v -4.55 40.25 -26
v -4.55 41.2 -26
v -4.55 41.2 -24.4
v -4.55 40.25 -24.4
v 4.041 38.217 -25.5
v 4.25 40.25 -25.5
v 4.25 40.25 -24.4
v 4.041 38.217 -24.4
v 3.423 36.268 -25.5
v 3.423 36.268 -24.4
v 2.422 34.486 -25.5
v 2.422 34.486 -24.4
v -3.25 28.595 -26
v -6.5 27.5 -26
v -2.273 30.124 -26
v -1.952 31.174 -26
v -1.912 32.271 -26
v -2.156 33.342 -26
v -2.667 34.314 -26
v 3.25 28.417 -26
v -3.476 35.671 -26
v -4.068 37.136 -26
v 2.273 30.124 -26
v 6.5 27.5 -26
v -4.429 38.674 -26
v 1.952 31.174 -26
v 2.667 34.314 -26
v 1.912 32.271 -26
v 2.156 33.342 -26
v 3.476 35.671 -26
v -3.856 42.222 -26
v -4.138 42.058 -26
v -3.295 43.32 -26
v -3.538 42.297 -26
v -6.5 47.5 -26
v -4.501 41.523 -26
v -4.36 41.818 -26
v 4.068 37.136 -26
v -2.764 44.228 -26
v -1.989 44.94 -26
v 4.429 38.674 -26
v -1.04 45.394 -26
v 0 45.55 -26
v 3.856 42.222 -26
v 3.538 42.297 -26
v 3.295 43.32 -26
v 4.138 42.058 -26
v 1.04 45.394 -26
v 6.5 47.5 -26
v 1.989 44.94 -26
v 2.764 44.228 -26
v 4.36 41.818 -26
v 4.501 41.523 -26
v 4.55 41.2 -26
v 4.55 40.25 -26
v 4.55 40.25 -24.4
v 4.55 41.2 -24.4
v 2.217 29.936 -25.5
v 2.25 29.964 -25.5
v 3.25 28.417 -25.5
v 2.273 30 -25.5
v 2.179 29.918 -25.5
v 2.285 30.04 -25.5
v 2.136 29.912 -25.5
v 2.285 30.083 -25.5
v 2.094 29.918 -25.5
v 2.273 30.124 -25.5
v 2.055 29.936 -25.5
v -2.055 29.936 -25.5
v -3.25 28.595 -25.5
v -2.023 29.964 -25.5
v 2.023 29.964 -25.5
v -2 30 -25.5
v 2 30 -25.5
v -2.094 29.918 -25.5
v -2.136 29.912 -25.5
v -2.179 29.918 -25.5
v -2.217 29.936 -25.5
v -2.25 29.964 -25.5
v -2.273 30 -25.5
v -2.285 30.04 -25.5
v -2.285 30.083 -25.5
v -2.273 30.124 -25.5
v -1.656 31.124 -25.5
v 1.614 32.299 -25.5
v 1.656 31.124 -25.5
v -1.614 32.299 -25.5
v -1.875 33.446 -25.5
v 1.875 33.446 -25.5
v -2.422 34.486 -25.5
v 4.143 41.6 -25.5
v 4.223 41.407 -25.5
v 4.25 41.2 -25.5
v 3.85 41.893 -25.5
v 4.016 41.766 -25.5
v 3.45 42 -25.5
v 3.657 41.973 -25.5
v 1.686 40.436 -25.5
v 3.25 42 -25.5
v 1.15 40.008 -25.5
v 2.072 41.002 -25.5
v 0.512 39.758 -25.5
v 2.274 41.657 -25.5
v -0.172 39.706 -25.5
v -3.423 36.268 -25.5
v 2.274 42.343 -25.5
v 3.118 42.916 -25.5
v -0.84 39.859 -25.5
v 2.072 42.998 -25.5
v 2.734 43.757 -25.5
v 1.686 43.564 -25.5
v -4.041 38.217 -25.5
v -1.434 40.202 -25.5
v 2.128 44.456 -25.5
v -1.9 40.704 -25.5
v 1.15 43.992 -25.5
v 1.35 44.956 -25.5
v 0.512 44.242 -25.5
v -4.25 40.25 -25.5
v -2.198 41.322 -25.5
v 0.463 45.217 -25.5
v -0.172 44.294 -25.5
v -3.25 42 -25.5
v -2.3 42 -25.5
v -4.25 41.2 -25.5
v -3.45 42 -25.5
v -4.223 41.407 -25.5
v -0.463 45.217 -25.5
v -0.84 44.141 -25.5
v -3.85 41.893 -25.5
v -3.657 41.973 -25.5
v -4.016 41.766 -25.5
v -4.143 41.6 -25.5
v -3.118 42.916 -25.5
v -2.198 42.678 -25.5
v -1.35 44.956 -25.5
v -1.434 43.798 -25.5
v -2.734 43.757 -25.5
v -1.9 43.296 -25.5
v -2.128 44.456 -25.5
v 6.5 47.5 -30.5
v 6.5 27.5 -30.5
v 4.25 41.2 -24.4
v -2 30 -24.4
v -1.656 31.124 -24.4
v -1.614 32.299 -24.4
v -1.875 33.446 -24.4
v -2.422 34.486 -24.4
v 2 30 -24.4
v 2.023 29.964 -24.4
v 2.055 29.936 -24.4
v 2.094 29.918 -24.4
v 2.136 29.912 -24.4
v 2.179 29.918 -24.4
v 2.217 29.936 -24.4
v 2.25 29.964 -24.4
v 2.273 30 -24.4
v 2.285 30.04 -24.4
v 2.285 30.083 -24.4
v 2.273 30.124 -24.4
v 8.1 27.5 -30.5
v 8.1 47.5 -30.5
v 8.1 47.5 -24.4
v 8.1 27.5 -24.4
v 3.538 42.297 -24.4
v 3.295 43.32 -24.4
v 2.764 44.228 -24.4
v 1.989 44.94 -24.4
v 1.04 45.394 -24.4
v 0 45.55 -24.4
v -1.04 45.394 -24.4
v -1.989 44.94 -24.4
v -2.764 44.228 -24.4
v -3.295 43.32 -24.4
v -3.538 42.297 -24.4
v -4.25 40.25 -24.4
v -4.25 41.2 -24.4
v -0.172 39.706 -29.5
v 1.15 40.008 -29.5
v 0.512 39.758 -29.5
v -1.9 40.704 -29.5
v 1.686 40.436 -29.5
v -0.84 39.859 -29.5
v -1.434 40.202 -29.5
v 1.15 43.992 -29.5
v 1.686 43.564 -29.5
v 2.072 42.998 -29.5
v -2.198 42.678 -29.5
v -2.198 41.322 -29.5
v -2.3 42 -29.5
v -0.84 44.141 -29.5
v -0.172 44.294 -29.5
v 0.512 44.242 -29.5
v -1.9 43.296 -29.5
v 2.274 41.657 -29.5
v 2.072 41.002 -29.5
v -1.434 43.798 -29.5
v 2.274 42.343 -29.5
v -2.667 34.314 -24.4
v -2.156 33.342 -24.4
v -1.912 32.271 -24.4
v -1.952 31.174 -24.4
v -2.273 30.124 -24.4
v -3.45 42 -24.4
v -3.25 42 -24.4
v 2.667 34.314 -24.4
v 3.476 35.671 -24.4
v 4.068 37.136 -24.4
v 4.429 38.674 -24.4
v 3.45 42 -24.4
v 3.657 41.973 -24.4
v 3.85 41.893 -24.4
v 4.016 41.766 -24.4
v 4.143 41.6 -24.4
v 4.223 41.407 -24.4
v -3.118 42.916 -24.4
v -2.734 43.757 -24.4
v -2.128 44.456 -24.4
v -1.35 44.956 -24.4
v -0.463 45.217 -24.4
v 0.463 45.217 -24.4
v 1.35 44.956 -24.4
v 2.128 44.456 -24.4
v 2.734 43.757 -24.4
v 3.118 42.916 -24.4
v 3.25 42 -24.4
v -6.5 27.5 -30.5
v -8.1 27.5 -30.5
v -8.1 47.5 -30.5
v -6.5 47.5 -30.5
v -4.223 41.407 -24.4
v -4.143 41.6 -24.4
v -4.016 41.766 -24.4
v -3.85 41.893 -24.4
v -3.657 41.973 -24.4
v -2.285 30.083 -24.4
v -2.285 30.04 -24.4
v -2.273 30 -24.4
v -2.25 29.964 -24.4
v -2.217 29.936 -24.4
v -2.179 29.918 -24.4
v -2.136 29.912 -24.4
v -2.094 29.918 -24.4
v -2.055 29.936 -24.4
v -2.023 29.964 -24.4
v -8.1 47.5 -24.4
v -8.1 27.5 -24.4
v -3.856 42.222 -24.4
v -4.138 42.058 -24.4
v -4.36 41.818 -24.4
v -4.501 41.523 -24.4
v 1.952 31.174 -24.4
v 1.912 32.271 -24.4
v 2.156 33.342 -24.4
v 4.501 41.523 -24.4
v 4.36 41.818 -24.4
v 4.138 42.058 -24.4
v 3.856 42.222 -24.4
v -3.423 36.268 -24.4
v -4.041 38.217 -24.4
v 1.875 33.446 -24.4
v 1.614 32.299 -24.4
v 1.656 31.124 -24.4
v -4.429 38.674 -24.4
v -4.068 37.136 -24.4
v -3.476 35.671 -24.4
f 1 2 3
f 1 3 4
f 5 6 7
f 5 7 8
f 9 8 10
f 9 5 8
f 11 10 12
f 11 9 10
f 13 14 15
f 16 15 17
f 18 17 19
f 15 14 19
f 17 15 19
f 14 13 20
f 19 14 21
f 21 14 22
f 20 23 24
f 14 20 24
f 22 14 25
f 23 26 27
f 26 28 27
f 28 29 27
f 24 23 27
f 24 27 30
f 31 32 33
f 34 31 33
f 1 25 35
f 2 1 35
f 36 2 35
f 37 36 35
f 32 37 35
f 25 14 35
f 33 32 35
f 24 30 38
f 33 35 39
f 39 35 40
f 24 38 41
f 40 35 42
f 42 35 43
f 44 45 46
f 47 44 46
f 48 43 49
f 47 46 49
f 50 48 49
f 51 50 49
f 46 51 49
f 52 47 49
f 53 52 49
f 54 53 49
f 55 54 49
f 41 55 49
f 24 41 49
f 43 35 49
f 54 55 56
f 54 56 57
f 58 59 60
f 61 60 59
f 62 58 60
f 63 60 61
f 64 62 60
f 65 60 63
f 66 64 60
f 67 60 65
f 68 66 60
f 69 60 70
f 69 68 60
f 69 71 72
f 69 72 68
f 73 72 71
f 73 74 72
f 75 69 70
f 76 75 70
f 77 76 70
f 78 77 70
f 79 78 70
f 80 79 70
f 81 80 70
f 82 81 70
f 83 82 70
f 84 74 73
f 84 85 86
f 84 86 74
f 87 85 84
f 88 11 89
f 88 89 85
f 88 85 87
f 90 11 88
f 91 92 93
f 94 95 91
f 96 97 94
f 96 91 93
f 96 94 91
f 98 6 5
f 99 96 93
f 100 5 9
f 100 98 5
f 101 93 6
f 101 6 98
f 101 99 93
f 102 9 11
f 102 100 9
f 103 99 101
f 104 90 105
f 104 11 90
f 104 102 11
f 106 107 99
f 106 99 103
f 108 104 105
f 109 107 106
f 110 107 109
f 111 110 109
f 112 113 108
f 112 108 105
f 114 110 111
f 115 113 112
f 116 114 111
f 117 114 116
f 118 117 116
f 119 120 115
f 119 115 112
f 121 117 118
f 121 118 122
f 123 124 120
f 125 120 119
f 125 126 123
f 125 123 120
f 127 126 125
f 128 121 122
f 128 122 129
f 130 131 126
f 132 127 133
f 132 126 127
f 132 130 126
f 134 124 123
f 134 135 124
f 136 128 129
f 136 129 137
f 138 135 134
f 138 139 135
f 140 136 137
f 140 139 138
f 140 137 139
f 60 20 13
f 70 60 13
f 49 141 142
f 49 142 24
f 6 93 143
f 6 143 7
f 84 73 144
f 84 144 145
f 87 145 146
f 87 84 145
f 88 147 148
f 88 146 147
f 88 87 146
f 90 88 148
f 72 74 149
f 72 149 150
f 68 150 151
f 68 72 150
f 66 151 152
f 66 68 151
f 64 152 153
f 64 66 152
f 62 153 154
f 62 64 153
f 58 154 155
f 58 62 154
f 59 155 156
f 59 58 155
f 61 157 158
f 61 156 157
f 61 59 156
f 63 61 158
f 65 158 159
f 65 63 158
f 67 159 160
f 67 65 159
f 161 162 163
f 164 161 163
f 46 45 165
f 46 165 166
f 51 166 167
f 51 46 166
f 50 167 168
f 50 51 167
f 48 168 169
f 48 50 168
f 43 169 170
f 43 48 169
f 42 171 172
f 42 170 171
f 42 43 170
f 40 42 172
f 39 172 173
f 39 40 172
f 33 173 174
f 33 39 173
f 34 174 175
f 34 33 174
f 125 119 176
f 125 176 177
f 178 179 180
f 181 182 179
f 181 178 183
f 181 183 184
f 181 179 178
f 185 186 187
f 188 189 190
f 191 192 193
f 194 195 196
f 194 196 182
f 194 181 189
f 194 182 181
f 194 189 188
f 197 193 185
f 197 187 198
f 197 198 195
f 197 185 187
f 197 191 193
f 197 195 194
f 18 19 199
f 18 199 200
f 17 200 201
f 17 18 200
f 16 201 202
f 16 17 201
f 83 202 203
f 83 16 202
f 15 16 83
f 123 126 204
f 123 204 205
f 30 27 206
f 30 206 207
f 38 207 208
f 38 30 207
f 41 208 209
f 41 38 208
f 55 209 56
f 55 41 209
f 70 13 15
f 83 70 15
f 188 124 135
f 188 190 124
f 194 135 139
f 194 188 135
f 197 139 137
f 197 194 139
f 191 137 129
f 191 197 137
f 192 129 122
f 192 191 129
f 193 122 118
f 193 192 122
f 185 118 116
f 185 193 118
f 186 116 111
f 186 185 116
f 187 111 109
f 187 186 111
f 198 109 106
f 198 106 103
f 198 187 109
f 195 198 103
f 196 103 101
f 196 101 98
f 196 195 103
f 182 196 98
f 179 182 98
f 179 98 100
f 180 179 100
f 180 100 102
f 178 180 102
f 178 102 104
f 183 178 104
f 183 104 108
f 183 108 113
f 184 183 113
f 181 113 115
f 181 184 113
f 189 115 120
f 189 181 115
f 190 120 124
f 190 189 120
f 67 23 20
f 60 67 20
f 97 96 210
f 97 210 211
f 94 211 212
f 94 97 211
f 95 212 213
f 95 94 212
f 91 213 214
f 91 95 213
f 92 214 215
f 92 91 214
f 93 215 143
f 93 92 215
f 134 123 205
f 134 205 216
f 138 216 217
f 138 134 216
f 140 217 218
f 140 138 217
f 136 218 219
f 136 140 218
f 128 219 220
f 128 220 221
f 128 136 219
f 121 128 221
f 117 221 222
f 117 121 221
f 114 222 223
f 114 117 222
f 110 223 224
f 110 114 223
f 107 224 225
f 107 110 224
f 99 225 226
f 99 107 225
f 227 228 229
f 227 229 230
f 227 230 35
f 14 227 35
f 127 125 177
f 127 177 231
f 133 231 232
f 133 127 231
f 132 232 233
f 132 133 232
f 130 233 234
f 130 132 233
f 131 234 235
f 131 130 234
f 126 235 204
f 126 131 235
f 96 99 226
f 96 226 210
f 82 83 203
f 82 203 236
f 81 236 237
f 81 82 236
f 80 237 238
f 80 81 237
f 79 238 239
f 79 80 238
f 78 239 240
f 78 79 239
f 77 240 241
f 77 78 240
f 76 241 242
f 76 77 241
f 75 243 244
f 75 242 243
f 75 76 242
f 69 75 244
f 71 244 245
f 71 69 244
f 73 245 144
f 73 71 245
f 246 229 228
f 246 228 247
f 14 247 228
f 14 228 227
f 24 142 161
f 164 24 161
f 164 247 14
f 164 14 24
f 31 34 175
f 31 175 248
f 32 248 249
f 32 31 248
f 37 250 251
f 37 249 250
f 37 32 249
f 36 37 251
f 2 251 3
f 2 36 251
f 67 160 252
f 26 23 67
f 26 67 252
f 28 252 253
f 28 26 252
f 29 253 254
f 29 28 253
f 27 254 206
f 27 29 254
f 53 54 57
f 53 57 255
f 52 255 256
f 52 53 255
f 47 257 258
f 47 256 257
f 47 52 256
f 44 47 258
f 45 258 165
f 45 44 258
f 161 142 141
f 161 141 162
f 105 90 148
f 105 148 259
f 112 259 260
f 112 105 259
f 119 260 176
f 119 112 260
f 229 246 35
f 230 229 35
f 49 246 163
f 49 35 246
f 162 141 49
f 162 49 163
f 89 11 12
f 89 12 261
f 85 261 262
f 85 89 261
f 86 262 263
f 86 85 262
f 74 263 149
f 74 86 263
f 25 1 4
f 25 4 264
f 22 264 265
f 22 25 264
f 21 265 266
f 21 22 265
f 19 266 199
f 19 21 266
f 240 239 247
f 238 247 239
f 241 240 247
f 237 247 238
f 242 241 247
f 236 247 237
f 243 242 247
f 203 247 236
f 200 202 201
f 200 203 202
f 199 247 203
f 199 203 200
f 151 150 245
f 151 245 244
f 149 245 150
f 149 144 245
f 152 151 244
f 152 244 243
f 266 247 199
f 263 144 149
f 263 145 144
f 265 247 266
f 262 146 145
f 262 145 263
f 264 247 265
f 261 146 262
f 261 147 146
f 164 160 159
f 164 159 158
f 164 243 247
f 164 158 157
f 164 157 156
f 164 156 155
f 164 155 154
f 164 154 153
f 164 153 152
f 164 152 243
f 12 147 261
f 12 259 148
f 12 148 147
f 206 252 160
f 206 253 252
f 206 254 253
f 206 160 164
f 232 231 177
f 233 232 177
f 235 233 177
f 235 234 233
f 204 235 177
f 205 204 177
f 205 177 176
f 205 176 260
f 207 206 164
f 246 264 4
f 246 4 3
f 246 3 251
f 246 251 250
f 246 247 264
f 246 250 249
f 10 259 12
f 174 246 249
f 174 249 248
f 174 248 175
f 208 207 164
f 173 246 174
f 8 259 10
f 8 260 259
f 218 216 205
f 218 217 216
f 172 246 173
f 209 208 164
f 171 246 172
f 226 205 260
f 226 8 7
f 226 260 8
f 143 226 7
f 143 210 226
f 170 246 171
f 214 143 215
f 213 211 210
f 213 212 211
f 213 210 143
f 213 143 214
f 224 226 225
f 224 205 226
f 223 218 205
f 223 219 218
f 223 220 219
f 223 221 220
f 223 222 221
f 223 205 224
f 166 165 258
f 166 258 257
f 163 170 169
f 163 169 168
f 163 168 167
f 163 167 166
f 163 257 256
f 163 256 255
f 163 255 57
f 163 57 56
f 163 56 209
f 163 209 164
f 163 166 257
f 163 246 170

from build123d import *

# Parameters (mm, degrees)
CUT_EXTRUDE1_DEPTH     = 5
CUT_EXTRUDE3_DEPTH     = 45
SKETCH8_R              = 40
CUT_EXTRUDE4_DEPTH     = 32
FILLET1_R              = 7
FILLET2_R              = 8
CUT_REVOLVE1_START     = 17
CUT_REVOLVE1_DEPTH     = 30.5
SKETCH18_W             = 13
SKETCH18_H             = 8
CUT_EXTRUDE13_DEPTH    = 5
SKETCH20_W             = 84
SKETCH20_H             = 7
CUT_EXTRUDE15_DEPTH    = 5
SKETCH19_R             = 1.5
CUT_EXTRUDE14_DEPTH    = 12
FILLET3_R              = 4
SKETCH21_W             = 16
SKETCH21_H             = 5
CUT_EXTRUDE16_DEPTH    = 5
CIRPATTERN1_COUNT      = 4
SKETCH22_W             = 5
SKETCH22_H             = 12
BOSS_EXTRUDE1_DEPTH    = 1.5
SKETCH23_W             = 5
SKETCH23_H             = 4.4
SKETCH23_H_2           = 4
BOSS_EXTRUDE2_DEPTH    = 17
SKETCH24_W             = 2
SKETCH24_H             = 3
BOSS_EXTRUDE3_DEPTH    = 2
CIRPATTERN2_COUNT      = 5
CUT_REVOLVE2_START     = 17
CUT_REVOLVE2_DEPTH     = 30.5
SKETCH29_W             = 16.2
SKETCH29_H             = 11.2
SKETCH29_W_2           = 13
SKETCH29_H_2           = 8
BOSS_EXTRUDE4_DEPTH    = 20
CUT_EXTRUDE18_DEPTH    = 12
SKETCH34_R             = 2.3
BOSS_EXTRUDE5_DEPTH    = 3.5
BOSS_EXTRUDE6_START    = 3.5
SKETCH35_R             = 2.3
BOSS_EXTRUDE6_DEPTH    = 3.5
SKETCH36_W             = 2
SKETCH36_H             = 2
BOSS_EXTRUDE7_DEPTH    = 5
SKETCH37_W             = 2
SKETCH37_H             = 2
BOSS_EXTRUDE8_DEPTH    = 12.5
SKETCH40_W             = 2
SKETCH40_H             = 2
BOSS_EXTRUDE9_DEPTH    = 5
INTERSECT5_OUTLINE_R   = 42
INTERSECT5_DEPTH       = 55
INTERSECT5_2_OUTLINE_W = 16
INTERSECT5_2_OUTLINE_H = 5
INTERSECT5_2_DEPTH     = 15.5
INTERSECT5_START       = 47.5
INTERSECT5_3_OUTLINE_W = 13
INTERSECT5_3_OUTLINE_H = 8
INTERSECT5_3_DEPTH     = 2.5
INTERSECT6_START       = -35.6
INTERSECT6_OUTLINE_W   = 16.2
INTERSECT6_OUTLINE_H   = 20
INTERSECT6_DEPTH       = 5.1
SKETCH46_R             = 2.3
CUT_EXTRUDE20_DEPTH    = 0.5


# Read off the part's stored shape, not the designer's step: Cut-Revolve1, Cut-Revolve2, Intersect5, Intersect6
with BuildPart() as part:
    # Sketch1 → Revolve1 (revolve)
    with BuildSketch(Plane.XY, mode=Mode.PRIVATE) as revolve1_sk:
        with BuildLine():
            Line((37, 55), (0, 55))
            Line((0, 55), (0, 11.5))
            Line((0, 11.5), (22.5, 11.5))
            Line((22.5, 11.5), (22.5, 0))
            Line((22.5, 0), (25, 0))
            Line((25, 0), (25, 11.5))
            Line((25, 11.5), (42, 11.5))
            Line((42, 11.5), (42, 50))
            ThreePointArc((42, 50), (40.535533906, 53.535533906), (37, 55))
        make_face()
    revolve(revolve1_sk.sketch.rotate(Axis((0, 2, 0), (0, 1, 0)), 90), axis=Axis((0, 2, 0), (0, 1, 0)))

    # Sketch5 → Cut-Extrude1 (cut)
    with BuildSketch(Plane(origin=(0, 55, 0), x_dir=(1, 0, 0), z_dir=(0, 1, 0))):
        with BuildLine():
            Line((-42, 0), (-40, 0))
            Line((-40, 0), (40, 0))
            Line((40, 0), (42, 0))
            ThreePointArc((42, 0), (0, 42), (-42, 0))
        make_face()
    extrude(amount=-CUT_EXTRUDE1_DEPTH, mode=Mode.SUBTRACT)

    # Sketch7 → Cut-Extrude3 (cut)
    with BuildSketch(Plane.XZ.offset(-11.5)):
        with BuildLine():
            Line((-21, 0), (21, 0))
            ThreePointArc((21, 0), (0, -21), (-21, 0))
        make_face()
    extrude(amount=-CUT_EXTRUDE3_DEPTH, mode=Mode.SUBTRACT)

    # Sketch8 → Cut-Extrude4 (cut)
    with BuildSketch(Plane(origin=(0, 47.5, 0), x_dir=(1, 0, 0), z_dir=(0, 1, 0))):
        with Locations(Location((0, 0, 0), (0, 0, 270))):
            Circle(SKETCH8_R)
        with BuildLine():
            Line((22.912878475, -2), (-22.912878475, -2))
            ThreePointArc((-22.912878475, -2), (0, 23), (22.912878475, -2))
        make_face(mode=Mode.SUBTRACT)
    extrude(amount=-CUT_EXTRUDE4_DEPTH, mode=Mode.SUBTRACT)

    # Fillet1
    fillet1_edges = [part.edges().sort_by_distance(p)[0] for p in [
        (21, 30.75, 0),
        (-21, 30.75, 0),
    ]]
    fillet(fillet1_edges, radius=FILLET1_R)

    # Fillet2
    fillet2_edges = [part.edges().sort_by_distance(p)[0] for p in [
        (-22.912878475, 31.5, 2),
        (22.912878475, 31.5, 2),
    ]]
    fillet(fillet2_edges, radius=FILLET2_R)

    # Cut-Revolve1 outline → Cut-Revolve1 (cut)
    with BuildSketch(Plane(origin=(0, 0, 0), x_dir=(1, 0, 0), z_dir=(0, 1, 0)).offset(CUT_REVOLVE1_START)):
        with BuildLine():
            Line((-34.641016151, -20), (-36.373066959, -21))
            ThreePointArc((-36.373066959, -21), (0, -42), (36.373066959, -21))
            Line((36.373066959, -21), (34.641016151, -20))
            ThreePointArc((34.641016151, -20), (0, -40), (-34.641016151, -20))
        make_face()
    extrude(amount=CUT_REVOLVE1_DEPTH, mode=Mode.SUBTRACT)

    # Sketch18 → Cut-Extrude13 (cut)
    with BuildSketch(Plane(origin=(0, 50, 0), x_dir=(1, 0, 0), z_dir=(0, 1, 0))):
        with Locations((0, 30)):
            Rectangle(SKETCH18_W, SKETCH18_H)
    extrude(amount=-CUT_EXTRUDE13_DEPTH, mode=Mode.SUBTRACT)

    # Sketch20 → Cut-Extrude15 (cut)
    with BuildSketch(Plane(origin=(0, 55, 0), x_dir=(1, 0, 0), z_dir=(0, 1, 0))):
        with Locations((0, -3.5)):
            Rectangle(SKETCH20_W, SKETCH20_H)
    extrude(amount=-CUT_EXTRUDE15_DEPTH, mode=Mode.SUBTRACT)

    # Sketch19 → Cut-Extrude14 (cut)
    with BuildSketch(Plane(origin=(0, 0, 7), x_dir=(-1, 0, 0), z_dir=(0, 0, -1))):
        with Locations((0, 52.5)):
            Circle(SKETCH19_R)
        with Locations((-29.412558482, 52.5)):
            Circle(SKETCH19_R)
        with Locations((29.412558482, 52.5)):
            Circle(SKETCH19_R)
    extrude(amount=-CUT_EXTRUDE14_DEPTH, mode=Mode.SUBTRACT)

    # Fillet3
    fillet3_edges = [part.edges().sort_by_distance(p)[0] for p in [
        (0, 11.5, 42),
    ]]
    fillet(fillet3_edges, radius=FILLET3_R)

    # Sketch21 → Cut-Extrude16 (cut)
    with BuildSketch(Plane(origin=(0, 15.5, 0), x_dir=(1, 0, 0), z_dir=(0, 1, 0))):
        with Locations((0, -29.5)):
            Rectangle(SKETCH21_W, SKETCH21_H)
    cut_extrude16 = extrude(amount=-CUT_EXTRUDE16_DEPTH, mode=Mode.SUBTRACT)

    # CirPattern1: Cut-Extrude16 ×4 about axis
    cirpattern1_axis = Axis((0, 0, 0), (0, 1, 0))
    for i in range(1, CIRPATTERN1_COUNT):
        add(cut_extrude16.rotate(cirpattern1_axis, i * 360 / CIRPATTERN1_COUNT), mode=Mode.SUBTRACT)

    # Sketch22 → Boss-Extrude1 (add)
    with BuildSketch(Plane(origin=(0, 15.5, 0), x_dir=(1, 0, 0), z_dir=(0, 1, 0))):
        with Locations((35.5, -4)):
            Rectangle(SKETCH22_W, SKETCH22_H)
    extrude(amount=BOSS_EXTRUDE1_DEPTH)

    # Sketch23 → Boss-Extrude2 (add)
    with BuildSketch(Plane(origin=(0, 17, 0), x_dir=(1, 0, 0), z_dir=(0, 1, 0))):
        with Locations((35.5, -0.2)):
            Rectangle(SKETCH23_W, SKETCH23_H)
        with Locations((35.5, -8)):
            Rectangle(SKETCH23_W, SKETCH23_H_2)
    extrude(amount=BOSS_EXTRUDE2_DEPTH)

    # Sketch24 → Boss-Extrude3 (add)
    with BuildSketch(Plane.XZ):
        with Locations((0, -22.5)):
            Rectangle(SKETCH24_W, SKETCH24_H)
    boss_extrude3 = extrude(amount=-BOSS_EXTRUDE3_DEPTH)

    # CirPattern2: Boss-Extrude3 ×5 about axis
    cirpattern2_axis = Axis((0, 0, 0), (0, 1, 0))
    for i in range(1, CIRPATTERN2_COUNT):
        add(boss_extrude3.rotate(cirpattern2_axis, i * 360 / CIRPATTERN2_COUNT))

    # Cut-Revolve2 outline → Cut-Revolve2 (cut)
    with BuildSketch(Plane(origin=(0, 0, 0), x_dir=(1, 0, 0), z_dir=(0, 1, 0)).offset(CUT_REVOLVE2_START)):
        with BuildLine():
            ThreePointArc((-30.641777725, 25.711504387), (0, 40), (30.641777725, 25.711504387))
            Line((30.641777725, 25.711504387), (32.173866611, 26.997079607))
            ThreePointArc((32.173866611, 26.997079607), (0, 42), (-32.173866611, 26.997079607))
            Line((-32.173866611, 26.997079607), (-30.641777725, 25.711504387))
        make_face()
    extrude(amount=CUT_REVOLVE2_DEPTH, mode=Mode.SUBTRACT)

    # Sketch29 → Boss-Extrude4 (add)
    with BuildSketch(Plane.XZ.offset(-47.5)):
        with Locations((0, -30)):
            Rectangle(SKETCH29_W, SKETCH29_H)
        with Locations((0, -30)):
            Rectangle(SKETCH29_W_2, SKETCH29_H_2, mode=Mode.SUBTRACT)
    extrude(amount=BOSS_EXTRUDE4_DEPTH)

    # Sketch32 → Cut-Extrude18 (cut)
    with BuildSketch(Plane(origin=(0, 0, -35.6), x_dir=(-1, 0, 0), z_dir=(0, 0, -1))):
        with BuildLine():
            Line((-4.55, 40.24987133), (-4.55, 41.2))
            ThreePointArc((-4.55, 41.2), (-4.258194078, 41.946205288), (-3.537595761, 42.296506718))
            ThreePointArc((-3.537595761, 42.296506718), (0, 45.55), (3.537595761, 42.296506718))
            ThreePointArc((3.537595761, 42.296506718), (4.258194078, 41.946205288), (4.55, 41.2))
            Line((4.55, 41.2), (4.55, 40.24987133))
            ThreePointArc((4.55, 40.24987133), (4.068040722, 37.136018992), (2.667266721, 34.313574426))
            ThreePointArc((2.667266721, 34.313574426), (1.91246078, 32.271330642), (2.273109943, 30.124140883))
            ThreePointArc((2.273109943, 30.124140883), (2.198625413, 29.92551547), (2, 30))
            ThreePointArc((2, 30), (1.613779787, 32.29943161), (2.422103613, 34.486476277))
            ThreePointArc((2.422103613, 34.486476277), (3.782078371, 37.22671372), (4.25, 40.24987133))
            Line((4.25, 40.24987133), (4.25, 41.2))
            ThreePointArc((4.25, 41.2), (4.015685425, 41.765685425), (3.45, 42))
            Line((3.45, 42), (3.25, 42))
            ThreePointArc((3.25, 42), (0, 45.25), (-3.25, 42))
            Line((-3.25, 42), (-3.45, 42))
            ThreePointArc((-3.45, 42), (-4.015685425, 41.765685425), (-4.25, 41.2))
            Line((-4.25, 41.2), (-4.25, 40.24987133))
            ThreePointArc((-4.25, 40.24987133), (-3.782078371, 37.22671372), (-2.422103613, 34.486476277))
            ThreePointArc((-2.422103613, 34.486476277), (-1.613779787, 32.29943161), (-2, 30))
            ThreePointArc((-2, 30), (-2.198625413, 29.92551547), (-2.273109943, 30.124140883))
            ThreePointArc((-2.273109943, 30.124140883), (-1.91246078, 32.271330642), (-2.667266721, 34.313574426))
            ThreePointArc((-2.667266721, 34.313574426), (-4.068040722, 37.136018992), (-4.55, 40.24987133))
        make_face()
    extrude(amount=-CUT_EXTRUDE18_DEPTH, mode=Mode.SUBTRACT)

    # Sketch34 → Boss-Extrude5 (add)
    with BuildSketch(Plane.XY.offset(-34)):
        with Locations(Location((0, 42, 0), (0, 0, 180))):
            Circle(SKETCH34_R)
    extrude(amount=BOSS_EXTRUDE5_DEPTH)

    # Sketch35 → Boss-Extrude6 (add)
    with BuildSketch(Plane(origin=(0, 0, -26), x_dir=(-1, 0, 0), z_dir=(0, 0, -1)).offset(BOSS_EXTRUDE6_START)):
        with Locations((0, 42)):
            Circle(SKETCH35_R)
    extrude(amount=-BOSS_EXTRUDE6_DEPTH)

    # Sketch36 → Boss-Extrude7 (add)
    with BuildSketch(Plane(origin=(0, 0, -35.6), x_dir=(-1, 0, 0), z_dir=(0, 0, -1))):
        with Locations((-6.159647943, 37.918102195)):
            Rectangle(SKETCH36_W, SKETCH36_H)
    extrude(amount=BOSS_EXTRUDE7_DEPTH)

    # Sketch37 → Boss-Extrude8 (add)
    with BuildSketch(Plane.ZY.offset(-5.159647943)):
        with Locations((-39.597351245, 37.918102195)):
            Rectangle(SKETCH37_W, SKETCH37_H)
    extrude(amount=BOSS_EXTRUDE8_DEPTH)

    # Sketch40 → Boss-Extrude9 (add)
    with BuildSketch(Plane(origin=(0, 0, -35.6), x_dir=(-1, 0, 0), z_dir=(0, 0, -1))):
        with Locations((6.340352057, 37.918102195)):
            Rectangle(SKETCH40_W, SKETCH40_H)
    extrude(amount=BOSS_EXTRUDE9_DEPTH)

    # Intersect5 outline → Intersect5 (cut)
    with BuildSketch(Plane(origin=(0, 0, 0), x_dir=(1, 0, 0), z_dir=(0, 1, 0))):
        Circle(INTERSECT5_OUTLINE_R)
        with BuildLine():
            Line((-7.340352057, 39.320722675), (-7.340352057, 35.6))
            Line((-7.340352057, 35.6), (7.159647943, 35.6))
            Line((7.159647943, 35.6), (7.159647943, 39.354027003))
            ThreePointArc((7.159647943, 39.354027003), (32.84390905, 22.831505389), (39.382737335, -7))
            Line((39.382737335, -7), (38, -7))
            Line((38, -7), (38, 2))
            Line((38, 2), (33, 2))
            Line((33, 2), (33, -7))
            Line((33, -7), (32, -7))
            Line((32, -7), (32, 8))
            Line((32, 8), (27, 8))
            Line((27, 8), (27, -7))
            Line((27, -7), (21.38340478, -7))
            ThreePointArc((21.38340478, -7), (22.491014191, -0.635830699), (21.744722088, 5.780749199))
            ThreePointArc((21.744722088, 5.780749199), (21.600641781, 7.527000579), (21.079848197, 9.2))
            ThreePointArc((21.079848197, 9.2), (0, 23), (-21.079848197, 9.2))
            ThreePointArc((-21.079848197, 9.2), (-21.600641781, 7.527000579), (-21.744722088, 5.780749199))
            ThreePointArc((-21.744722088, 5.780749199), (-22.491014191, -0.635830699), (-21.38340478, -7))
            Line((-21.38340478, -7), (-27, -7))
            Line((-27, -7), (-27, 8))
            Line((-27, 8), (-32, 8))
            Line((-32, 8), (-32, -7))
            Line((-32, -7), (-39.382737335, -7))
            ThreePointArc((-39.382737335, -7), (-32.896262825, 22.756007825), (-7.340352057, 39.320722675))
        make_face(mode=Mode.SUBTRACT)
        with BuildLine():
            Line((12.124355653, 0), (-12.124355653, 0))
            ThreePointArc((-12.124355653, 0), (-18.186533479, 3.5), (-18.186533479, 10.5))
            ThreePointArc((-18.186533479, 10.5), (0, 21), (18.186533479, 10.5))
            ThreePointArc((18.186533479, 10.5), (18.186533479, 3.5), (12.124355653, 0))
        make_face(mode=Mode.SUBTRACT)
    extrude(amount=INTERSECT5_DEPTH, mode=Mode.SUBTRACT)

    # Intersect5 2 outline → Intersect5 2 (cut)
    with BuildSketch(Plane(origin=(0, 0, 0), x_dir=(1, 0, 0), z_dir=(0, 1, 0))):
        with BuildLine():
            Line((-7.340352057, 35.6), (-7.340352057, 39.320722675))
            ThreePointArc((-7.340352057, 39.320722675), (-32.896262825, 22.756007825), (-39.382737335, -7))
            Line((-39.382737335, -7), (-32, -7))
            Line((-32, -7), (-32, 8))
            Line((-32, 8), (-27, 8))
            Line((-27, 8), (-27, -7))
            Line((-27, -7), (-21.38340478, -7))
            ThreePointArc((-21.38340478, -7), (-22.491014191, -0.635830699), (-21.744722088, 5.780749199))
            ThreePointArc((-21.744722088, 5.780749199), (-21.600641781, 7.527000579), (-21.079848197, 9.2))
            ThreePointArc((-21.079848197, 9.2), (0, 23), (21.079848197, 9.2))
            ThreePointArc((21.079848197, 9.2), (21.600641781, 7.527000579), (21.744722088, 5.780749199))
            ThreePointArc((21.744722088, 5.780749199), (22.491014191, -0.635830699), (21.38340478, -7))
            Line((21.38340478, -7), (27, -7))
            Line((27, -7), (27, 8))
            Line((27, 8), (32, 8))
            Line((32, 8), (32, -7))
            Line((32, -7), (33, -7))
            Line((33, -7), (33, 2))
            Line((33, 2), (38, 2))
            Line((38, 2), (38, -7))
            Line((38, -7), (39.382737335, -7))
            ThreePointArc((39.382737335, -7), (32.84390905, 22.831505389), (7.159647943, 39.354027003))
            Line((7.159647943, 39.354027003), (7.159647943, 35.6))
            Line((7.159647943, 35.6), (-7.340352057, 35.6))
        make_face()
        with Locations((0, 29.5)):
            Rectangle(INTERSECT5_2_OUTLINE_W, INTERSECT5_2_OUTLINE_H, mode=Mode.SUBTRACT)
    extrude(amount=INTERSECT5_2_DEPTH, mode=Mode.SUBTRACT)

    # Intersect5 3 outline → Intersect5 3 (cut)
    with BuildSketch(Plane(origin=(0, 0, 0), x_dir=(1, 0, 0), z_dir=(0, 1, 0)).offset(INTERSECT5_START)):
        with BuildLine():
            Line((-7.340352057, 35.6), (-7.340352057, 39.320722675))
            ThreePointArc((-7.340352057, 39.320722675), (-32.896262825, 22.756007825), (-39.382737335, -7))
            Line((-39.382737335, -7), (-32, -7))
            Line((-32, -7), (-32, 8))
            Line((-32, 8), (-27, 8))
            Line((-27, 8), (-27, -7))
            Line((-27, -7), (-21.38340478, -7))
            ThreePointArc((-21.38340478, -7), (-22.491014191, -0.635830699), (-21.744722088, 5.780749199))
            ThreePointArc((-21.744722088, 5.780749199), (-21.600641781, 7.527000579), (-21.079848197, 9.2))
            ThreePointArc((-21.079848197, 9.2), (0, 23), (21.079848197, 9.2))
            ThreePointArc((21.079848197, 9.2), (21.600641781, 7.527000579), (21.744722088, 5.780749199))
            ThreePointArc((21.744722088, 5.780749199), (22.491014191, -0.635830699), (21.38340478, -7))
            Line((21.38340478, -7), (27, -7))
            Line((27, -7), (27, 8))
            Line((27, 8), (32, 8))
            Line((32, 8), (32, -7))
            Line((32, -7), (33, -7))
            Line((33, -7), (33, 2))
            Line((33, 2), (38, 2))
            Line((38, 2), (38, -7))
            Line((38, -7), (39.382737335, -7))
            ThreePointArc((39.382737335, -7), (32.84390905, 22.831505389), (7.159647943, 39.354027003))
            Line((7.159647943, 39.354027003), (7.159647943, 35.6))
            Line((7.159647943, 35.6), (-7.340352057, 35.6))
        make_face()
        with Locations((0, 30)):
            Rectangle(INTERSECT5_3_OUTLINE_W, INTERSECT5_3_OUTLINE_H, mode=Mode.SUBTRACT)
    extrude(amount=INTERSECT5_3_DEPTH, mode=Mode.SUBTRACT)

    # Intersect6 outline → Intersect6 (cut)
    with BuildSketch(Plane.XY.offset(INTERSECT6_START)):
        with Locations((0, 37.5)):
            Rectangle(INTERSECT6_OUTLINE_W, INTERSECT6_OUTLINE_H)
        with BuildLine():
            ThreePointArc((4.25, 41.2), (4.015685425, 41.765685425), (3.45, 42))
            Line((3.45, 42), (3.25, 42))
            ThreePointArc((3.25, 42), (0, 45.25), (-3.25, 42))
            Line((-3.25, 42), (-3.45, 42))
            ThreePointArc((-3.45, 42), (-4.015685425, 41.765685425), (-4.25, 41.2))
            Line((-4.25, 41.2), (-4.25, 40.24987133))
            ThreePointArc((-4.25, 40.24987133), (-3.782078371, 37.22671372), (-2.422103613, 34.486476277))
            ThreePointArc((-2.422103613, 34.486476277), (-1.613779787, 32.29943161), (-2, 30))
            ThreePointArc((-2, 30), (-2.198625413, 29.92551547), (-2.273109943, 30.124140883))
            ThreePointArc((-2.273109943, 30.124140883), (-1.91246078, 32.271330642), (-2.667266721, 34.313574426))
            ThreePointArc((-2.667266721, 34.313574426), (-4.068040722, 37.136018992), (-4.55, 40.24987133))
            Line((-4.55, 40.24987133), (-4.55, 41.2))
            ThreePointArc((-4.55, 41.2), (-4.258194078, 41.946205288), (-3.537595761, 42.296506718))
            ThreePointArc((-3.537595761, 42.296506718), (0, 45.55), (3.537595761, 42.296506718))
            ThreePointArc((3.537595761, 42.296506718), (4.258194078, 41.946205288), (4.55, 41.2))
            Line((4.55, 41.2), (4.55, 40.24987133))
            ThreePointArc((4.55, 40.24987133), (4.068040722, 37.136018992), (2.667266721, 34.313574426))
            ThreePointArc((2.667266721, 34.313574426), (1.91246078, 32.271330642), (2.273109943, 30.124140883))
            ThreePointArc((2.273109943, 30.124140883), (2.198625413, 29.92551547), (2, 30))
            ThreePointArc((2, 30), (1.613779787, 32.29943161), (2.422103613, 34.486476277))
            ThreePointArc((2.422103613, 34.486476277), (3.782078371, 37.22671372), (4.25, 40.24987133))
            Line((4.25, 40.24987133), (4.25, 41.2))
        make_face(mode=Mode.SUBTRACT)
    extrude(amount=INTERSECT6_DEPTH, mode=Mode.SUBTRACT)

    # Sketch46 → Cut-Extrude20 (cut)
    with BuildSketch(Plane(origin=(0, 0, -26), x_dir=(-1, 0, 0), z_dir=(0, 0, -1))):
        with BuildLine():
            Line((-3.25, 28.417174007), (3.25, 28.594756863))
            Line((3.25, 28.594756863), (2.273109943, 30.124140883))
            ThreePointArc((2.273109943, 30.124140883), (2.198625413, 29.92551547), (2, 30))
            ThreePointArc((2, 30), (1.613779787, 32.29943161), (2.422103613, 34.486476277))
            ThreePointArc((2.422103613, 34.486476277), (3.782078371, 37.22671372), (4.25, 40.24987133))
            Line((4.25, 40.24987133), (4.25, 41.2))
            ThreePointArc((4.25, 41.2), (4.015685425, 41.765685425), (3.45, 42))
            Line((3.45, 42), (3.25, 42))
            ThreePointArc((3.25, 42), (0, 45.25), (-3.25, 42))
            Line((-3.25, 42), (-3.45, 42))
            ThreePointArc((-3.45, 42), (-4.015685425, 41.765685425), (-4.25, 41.2))
            Line((-4.25, 41.2), (-4.25, 40.24987133))
            ThreePointArc((-4.25, 40.24987133), (-3.782078371, 37.22671372), (-2.422103613, 34.486476277))
            ThreePointArc((-2.422103613, 34.486476277), (-1.613779787, 32.29943161), (-2, 30))
            ThreePointArc((-2, 30), (-2.198625413, 29.92551547), (-2.273109943, 30.124140883))
            Line((-2.273109943, 30.124140883), (-3.25, 28.417174007))
        make_face()
        with Locations((0, 42)):
            Circle(SKETCH46_R, mode=Mode.SUBTRACT)
    extrude(amount=-CUT_EXTRUDE20_DEPTH, mode=Mode.SUBTRACT)


solid = part.part
